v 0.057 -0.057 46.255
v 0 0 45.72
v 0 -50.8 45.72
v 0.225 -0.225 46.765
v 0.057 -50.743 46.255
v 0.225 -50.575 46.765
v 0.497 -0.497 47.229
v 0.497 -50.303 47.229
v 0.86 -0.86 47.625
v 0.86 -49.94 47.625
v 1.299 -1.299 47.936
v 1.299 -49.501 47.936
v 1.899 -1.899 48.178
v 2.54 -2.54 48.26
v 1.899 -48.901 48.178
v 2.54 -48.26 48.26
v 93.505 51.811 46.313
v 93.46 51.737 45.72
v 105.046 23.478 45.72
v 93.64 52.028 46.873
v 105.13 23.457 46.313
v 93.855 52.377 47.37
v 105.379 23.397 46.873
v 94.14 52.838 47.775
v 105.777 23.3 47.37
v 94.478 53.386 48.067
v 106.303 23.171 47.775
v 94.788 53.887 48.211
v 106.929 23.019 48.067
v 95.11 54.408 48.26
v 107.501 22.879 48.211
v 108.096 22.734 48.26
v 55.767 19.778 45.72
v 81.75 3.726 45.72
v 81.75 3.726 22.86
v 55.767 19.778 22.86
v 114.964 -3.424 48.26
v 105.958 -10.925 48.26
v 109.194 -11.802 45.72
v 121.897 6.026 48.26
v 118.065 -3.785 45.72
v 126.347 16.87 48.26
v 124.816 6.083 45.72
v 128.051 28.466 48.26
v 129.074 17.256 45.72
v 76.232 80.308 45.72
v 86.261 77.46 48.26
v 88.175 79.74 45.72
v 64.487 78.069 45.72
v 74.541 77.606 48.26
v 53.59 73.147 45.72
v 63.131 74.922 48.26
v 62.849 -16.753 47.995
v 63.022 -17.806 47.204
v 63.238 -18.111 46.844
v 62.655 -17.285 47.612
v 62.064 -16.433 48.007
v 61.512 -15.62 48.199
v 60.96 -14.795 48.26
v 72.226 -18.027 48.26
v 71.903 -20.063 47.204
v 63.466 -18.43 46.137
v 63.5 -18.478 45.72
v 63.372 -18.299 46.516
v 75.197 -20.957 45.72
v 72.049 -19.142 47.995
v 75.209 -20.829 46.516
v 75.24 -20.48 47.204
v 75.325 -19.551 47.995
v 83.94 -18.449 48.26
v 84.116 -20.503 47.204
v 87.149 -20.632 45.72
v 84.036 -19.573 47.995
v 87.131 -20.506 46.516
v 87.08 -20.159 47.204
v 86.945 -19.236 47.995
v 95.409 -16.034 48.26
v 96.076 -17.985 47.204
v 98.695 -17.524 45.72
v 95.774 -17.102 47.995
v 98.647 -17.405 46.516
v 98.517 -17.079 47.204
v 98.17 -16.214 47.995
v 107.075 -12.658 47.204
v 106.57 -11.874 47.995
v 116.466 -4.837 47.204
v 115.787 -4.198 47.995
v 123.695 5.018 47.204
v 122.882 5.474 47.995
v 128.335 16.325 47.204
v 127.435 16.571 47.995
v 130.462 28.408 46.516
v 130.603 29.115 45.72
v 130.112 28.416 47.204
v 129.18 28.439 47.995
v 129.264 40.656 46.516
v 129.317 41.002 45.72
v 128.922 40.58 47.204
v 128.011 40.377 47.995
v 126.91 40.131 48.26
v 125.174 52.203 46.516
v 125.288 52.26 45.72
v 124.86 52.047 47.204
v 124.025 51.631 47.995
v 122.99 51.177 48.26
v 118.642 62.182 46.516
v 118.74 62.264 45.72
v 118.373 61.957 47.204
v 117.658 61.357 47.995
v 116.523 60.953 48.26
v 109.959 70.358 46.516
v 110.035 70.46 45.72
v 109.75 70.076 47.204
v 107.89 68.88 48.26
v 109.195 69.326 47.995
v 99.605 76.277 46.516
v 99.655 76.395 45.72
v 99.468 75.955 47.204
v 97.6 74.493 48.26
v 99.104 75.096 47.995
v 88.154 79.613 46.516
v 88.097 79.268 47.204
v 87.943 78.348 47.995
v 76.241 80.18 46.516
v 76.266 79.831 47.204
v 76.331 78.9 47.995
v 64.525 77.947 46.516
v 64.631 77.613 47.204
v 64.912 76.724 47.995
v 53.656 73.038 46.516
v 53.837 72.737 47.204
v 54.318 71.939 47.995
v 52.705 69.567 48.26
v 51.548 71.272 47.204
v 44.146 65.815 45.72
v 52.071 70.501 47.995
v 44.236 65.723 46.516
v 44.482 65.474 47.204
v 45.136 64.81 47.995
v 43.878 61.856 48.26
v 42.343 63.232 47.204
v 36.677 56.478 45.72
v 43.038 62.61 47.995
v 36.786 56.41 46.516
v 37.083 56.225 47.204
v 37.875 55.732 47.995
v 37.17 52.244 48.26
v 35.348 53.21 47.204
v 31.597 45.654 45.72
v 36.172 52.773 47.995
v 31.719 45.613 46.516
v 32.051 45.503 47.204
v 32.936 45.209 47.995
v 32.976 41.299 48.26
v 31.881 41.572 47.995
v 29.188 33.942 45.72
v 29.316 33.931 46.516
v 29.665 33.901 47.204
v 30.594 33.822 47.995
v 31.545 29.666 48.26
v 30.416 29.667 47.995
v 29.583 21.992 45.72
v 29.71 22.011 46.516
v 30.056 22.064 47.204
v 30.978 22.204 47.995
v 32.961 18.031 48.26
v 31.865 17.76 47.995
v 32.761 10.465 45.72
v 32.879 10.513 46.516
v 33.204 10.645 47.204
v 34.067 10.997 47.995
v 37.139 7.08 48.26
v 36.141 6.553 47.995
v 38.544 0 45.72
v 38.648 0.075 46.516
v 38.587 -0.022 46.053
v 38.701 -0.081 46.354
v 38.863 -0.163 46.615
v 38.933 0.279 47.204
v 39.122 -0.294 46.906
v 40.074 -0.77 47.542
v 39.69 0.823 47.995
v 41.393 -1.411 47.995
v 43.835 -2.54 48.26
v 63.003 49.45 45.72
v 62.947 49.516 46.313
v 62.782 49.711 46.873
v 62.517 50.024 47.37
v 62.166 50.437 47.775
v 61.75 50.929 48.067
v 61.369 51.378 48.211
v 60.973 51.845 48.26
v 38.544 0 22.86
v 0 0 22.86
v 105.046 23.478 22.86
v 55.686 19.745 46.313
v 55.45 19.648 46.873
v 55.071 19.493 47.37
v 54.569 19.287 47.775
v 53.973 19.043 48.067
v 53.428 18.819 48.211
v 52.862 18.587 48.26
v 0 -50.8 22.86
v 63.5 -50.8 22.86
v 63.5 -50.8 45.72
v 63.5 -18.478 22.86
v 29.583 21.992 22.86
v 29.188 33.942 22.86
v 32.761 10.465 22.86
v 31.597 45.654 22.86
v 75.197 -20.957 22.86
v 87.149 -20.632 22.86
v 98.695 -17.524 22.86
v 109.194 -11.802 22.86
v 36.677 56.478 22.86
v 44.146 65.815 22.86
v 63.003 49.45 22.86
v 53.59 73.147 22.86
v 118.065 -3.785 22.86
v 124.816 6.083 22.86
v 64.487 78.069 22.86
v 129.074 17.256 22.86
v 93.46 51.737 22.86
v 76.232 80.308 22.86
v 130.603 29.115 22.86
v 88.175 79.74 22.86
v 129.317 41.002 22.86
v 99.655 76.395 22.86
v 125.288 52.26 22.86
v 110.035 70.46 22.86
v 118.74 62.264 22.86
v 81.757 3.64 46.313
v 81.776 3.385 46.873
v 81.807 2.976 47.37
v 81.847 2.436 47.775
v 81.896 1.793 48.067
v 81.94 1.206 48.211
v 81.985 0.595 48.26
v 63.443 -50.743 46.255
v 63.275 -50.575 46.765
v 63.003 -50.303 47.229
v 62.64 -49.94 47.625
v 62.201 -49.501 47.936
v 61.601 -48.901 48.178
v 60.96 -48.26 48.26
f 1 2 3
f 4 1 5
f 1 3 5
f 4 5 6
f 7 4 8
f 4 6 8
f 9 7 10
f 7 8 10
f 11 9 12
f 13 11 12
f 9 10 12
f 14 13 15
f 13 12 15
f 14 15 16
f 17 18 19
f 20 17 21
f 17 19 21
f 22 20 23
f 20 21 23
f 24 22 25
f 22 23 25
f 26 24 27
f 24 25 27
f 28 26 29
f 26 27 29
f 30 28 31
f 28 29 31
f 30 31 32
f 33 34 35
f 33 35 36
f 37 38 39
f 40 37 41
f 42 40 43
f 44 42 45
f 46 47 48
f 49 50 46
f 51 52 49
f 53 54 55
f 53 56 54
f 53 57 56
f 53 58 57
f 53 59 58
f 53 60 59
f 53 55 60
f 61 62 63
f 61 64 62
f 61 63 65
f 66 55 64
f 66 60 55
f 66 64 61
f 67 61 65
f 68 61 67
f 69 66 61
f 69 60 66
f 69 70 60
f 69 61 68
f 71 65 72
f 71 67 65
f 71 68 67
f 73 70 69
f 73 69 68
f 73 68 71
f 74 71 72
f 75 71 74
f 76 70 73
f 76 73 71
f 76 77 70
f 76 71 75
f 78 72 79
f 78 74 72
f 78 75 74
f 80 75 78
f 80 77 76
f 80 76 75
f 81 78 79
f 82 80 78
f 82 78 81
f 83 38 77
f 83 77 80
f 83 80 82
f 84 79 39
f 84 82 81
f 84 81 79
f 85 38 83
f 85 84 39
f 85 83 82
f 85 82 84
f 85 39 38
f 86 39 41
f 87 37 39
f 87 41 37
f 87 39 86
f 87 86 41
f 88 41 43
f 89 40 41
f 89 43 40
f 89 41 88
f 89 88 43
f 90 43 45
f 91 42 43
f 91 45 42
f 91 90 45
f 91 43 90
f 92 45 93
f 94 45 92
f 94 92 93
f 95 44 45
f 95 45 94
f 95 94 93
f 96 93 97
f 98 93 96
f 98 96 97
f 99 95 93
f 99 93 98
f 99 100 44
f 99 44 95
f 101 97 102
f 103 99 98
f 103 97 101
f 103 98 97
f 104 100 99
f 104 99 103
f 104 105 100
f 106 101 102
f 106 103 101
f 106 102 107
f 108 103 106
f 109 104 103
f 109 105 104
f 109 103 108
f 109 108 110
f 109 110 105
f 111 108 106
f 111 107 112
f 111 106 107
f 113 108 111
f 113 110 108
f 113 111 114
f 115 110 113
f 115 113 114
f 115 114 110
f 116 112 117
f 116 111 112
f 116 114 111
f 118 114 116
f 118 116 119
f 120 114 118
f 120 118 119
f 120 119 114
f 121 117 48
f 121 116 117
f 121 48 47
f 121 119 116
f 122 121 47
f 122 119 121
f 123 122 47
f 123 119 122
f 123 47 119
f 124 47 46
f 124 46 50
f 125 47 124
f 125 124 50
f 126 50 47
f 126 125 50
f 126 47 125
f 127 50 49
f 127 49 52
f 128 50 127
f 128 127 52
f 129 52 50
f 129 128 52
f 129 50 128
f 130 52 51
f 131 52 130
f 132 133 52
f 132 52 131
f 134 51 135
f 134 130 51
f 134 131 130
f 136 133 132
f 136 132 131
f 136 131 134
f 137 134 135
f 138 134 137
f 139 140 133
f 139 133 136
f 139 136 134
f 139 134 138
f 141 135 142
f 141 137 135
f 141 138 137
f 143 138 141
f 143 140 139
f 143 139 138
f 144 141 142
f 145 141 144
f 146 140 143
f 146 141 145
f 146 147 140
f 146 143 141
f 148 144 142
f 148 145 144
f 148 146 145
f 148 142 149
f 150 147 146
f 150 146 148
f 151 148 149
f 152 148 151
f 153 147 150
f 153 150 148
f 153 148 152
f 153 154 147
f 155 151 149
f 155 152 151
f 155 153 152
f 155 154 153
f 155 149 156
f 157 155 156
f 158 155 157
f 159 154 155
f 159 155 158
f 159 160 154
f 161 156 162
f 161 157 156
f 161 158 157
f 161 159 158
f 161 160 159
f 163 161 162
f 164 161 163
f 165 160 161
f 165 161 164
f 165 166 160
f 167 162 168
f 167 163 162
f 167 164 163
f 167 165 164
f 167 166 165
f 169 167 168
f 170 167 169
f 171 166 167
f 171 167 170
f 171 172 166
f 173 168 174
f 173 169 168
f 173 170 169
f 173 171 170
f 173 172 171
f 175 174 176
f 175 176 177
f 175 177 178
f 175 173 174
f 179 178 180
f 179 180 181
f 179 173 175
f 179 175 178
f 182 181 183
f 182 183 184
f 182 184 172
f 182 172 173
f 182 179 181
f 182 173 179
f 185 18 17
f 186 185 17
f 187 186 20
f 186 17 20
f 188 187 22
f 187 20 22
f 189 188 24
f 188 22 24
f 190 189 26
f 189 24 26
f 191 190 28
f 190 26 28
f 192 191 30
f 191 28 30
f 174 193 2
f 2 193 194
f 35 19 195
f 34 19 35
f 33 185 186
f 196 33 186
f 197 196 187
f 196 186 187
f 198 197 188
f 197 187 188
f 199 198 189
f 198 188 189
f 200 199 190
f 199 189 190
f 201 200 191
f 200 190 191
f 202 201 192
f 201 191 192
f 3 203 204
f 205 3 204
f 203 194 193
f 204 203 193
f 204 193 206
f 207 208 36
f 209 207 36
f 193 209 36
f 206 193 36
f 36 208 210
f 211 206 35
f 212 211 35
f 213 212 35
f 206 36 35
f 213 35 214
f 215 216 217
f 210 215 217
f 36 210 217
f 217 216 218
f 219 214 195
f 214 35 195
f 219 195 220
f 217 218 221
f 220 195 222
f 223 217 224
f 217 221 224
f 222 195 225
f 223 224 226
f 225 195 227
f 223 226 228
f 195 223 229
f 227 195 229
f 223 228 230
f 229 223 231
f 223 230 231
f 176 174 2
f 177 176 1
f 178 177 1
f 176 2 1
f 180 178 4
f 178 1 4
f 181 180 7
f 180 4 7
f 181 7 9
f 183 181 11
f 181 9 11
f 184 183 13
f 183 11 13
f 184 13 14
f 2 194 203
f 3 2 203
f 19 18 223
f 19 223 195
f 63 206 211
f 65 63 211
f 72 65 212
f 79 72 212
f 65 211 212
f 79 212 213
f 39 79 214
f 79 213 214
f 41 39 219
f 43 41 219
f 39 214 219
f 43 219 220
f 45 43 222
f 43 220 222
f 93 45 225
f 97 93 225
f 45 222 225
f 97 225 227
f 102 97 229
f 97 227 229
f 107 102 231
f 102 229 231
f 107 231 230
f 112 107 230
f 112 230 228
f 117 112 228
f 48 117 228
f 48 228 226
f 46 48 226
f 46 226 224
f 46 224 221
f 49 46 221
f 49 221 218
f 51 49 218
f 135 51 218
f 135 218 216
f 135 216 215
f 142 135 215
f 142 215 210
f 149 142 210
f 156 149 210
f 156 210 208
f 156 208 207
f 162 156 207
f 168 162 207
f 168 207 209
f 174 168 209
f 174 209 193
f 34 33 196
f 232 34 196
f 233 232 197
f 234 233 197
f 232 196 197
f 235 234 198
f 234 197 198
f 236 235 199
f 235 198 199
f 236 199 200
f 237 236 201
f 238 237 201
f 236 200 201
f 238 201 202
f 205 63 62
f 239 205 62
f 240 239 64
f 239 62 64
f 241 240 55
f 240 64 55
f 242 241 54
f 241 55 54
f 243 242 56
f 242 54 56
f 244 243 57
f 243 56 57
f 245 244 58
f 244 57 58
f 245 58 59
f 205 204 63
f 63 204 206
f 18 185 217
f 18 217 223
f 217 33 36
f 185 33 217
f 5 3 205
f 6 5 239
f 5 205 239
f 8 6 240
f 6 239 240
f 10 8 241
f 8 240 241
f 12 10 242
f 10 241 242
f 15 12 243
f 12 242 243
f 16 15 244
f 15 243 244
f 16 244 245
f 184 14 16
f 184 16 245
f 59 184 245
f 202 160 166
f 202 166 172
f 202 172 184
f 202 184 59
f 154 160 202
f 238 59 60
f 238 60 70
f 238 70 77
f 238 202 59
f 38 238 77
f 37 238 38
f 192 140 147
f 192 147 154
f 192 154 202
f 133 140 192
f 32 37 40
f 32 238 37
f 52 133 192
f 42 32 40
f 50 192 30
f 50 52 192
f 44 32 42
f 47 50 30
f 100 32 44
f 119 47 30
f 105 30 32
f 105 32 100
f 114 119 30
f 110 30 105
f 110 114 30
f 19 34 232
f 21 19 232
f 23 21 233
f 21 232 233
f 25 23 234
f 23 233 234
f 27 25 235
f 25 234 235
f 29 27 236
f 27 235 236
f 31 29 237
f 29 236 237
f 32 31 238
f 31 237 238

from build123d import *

# Parameters (mm, degrees)
F1_DEPTH = 48.26
F3_DEPTH = 25.4
F4_R     = 2.54


with BuildPart() as f1:
    # F0 (on Top) → F1 (new body)
    with BuildSketch(Plane.XY):
        with BuildLine():
            Line((0, -50.8), (63.5, -50.8))
            Line((63.5, -50.8), (63.5, -18.4782915836))
            ThreePointArc((63.5, -18.4782915836), (110.0348201001, 70.4604594113), (38.5441593826, 0))
            Line((38.5441593826, 0), (0, 0))
            Line((0, 0), (0, -50.8))
        make_face()
    extrude(amount=F1_DEPTH)

    # F2 (on face) → F3 (intersect)
    with BuildSketch(Plane.XY.offset(48.26)):
        with BuildLine():
            ThreePointArc((63.5, -18.4782915836), (110.0348201001, 70.4604594113), (38.5441593826, 0))
            Line((38.5441593826, 0), (0, 0))
            Line((0, 0), (0, -50.8))
            Line((0, -50.8), (63.5, -50.8))
            Line((63.5, -50.8), (63.5, -18.4782915836))
        make_face()
        Polygon((81.7504222175, 3.7261128257), (55.766562748, 19.7779196896), (63.0032841086, 49.4503196679), (93.4596833462, 51.7370645185), (105.0460518893, 23.4779505813), align=None, mode=Mode.SUBTRACT)
    extrude(amount=-F3_DEPTH, mode=Mode.INTERSECT)

    # F4
    f4_edges = [f1.edges().sort_by_distance(p)[0] for p in [
        (110.03482, 70.460459, 48.26),
        (19.27208, 0, 48.26),
        (0, -25.4, 48.26),
        (63.5, -34.639146, 48.26),
        (31.75, -50.8, 48.26),
        (99.252868, 37.607508, 48.26),
        (78.231484, 50.593692, 48.26),
        (59.384923, 34.61412, 48.26),
        (68.758492, 11.752016, 48.26),
        (93.398237, 13.602032, 48.26),
    ]]
    fillet(f4_edges, radius=F4_R)


solid = f1.part
